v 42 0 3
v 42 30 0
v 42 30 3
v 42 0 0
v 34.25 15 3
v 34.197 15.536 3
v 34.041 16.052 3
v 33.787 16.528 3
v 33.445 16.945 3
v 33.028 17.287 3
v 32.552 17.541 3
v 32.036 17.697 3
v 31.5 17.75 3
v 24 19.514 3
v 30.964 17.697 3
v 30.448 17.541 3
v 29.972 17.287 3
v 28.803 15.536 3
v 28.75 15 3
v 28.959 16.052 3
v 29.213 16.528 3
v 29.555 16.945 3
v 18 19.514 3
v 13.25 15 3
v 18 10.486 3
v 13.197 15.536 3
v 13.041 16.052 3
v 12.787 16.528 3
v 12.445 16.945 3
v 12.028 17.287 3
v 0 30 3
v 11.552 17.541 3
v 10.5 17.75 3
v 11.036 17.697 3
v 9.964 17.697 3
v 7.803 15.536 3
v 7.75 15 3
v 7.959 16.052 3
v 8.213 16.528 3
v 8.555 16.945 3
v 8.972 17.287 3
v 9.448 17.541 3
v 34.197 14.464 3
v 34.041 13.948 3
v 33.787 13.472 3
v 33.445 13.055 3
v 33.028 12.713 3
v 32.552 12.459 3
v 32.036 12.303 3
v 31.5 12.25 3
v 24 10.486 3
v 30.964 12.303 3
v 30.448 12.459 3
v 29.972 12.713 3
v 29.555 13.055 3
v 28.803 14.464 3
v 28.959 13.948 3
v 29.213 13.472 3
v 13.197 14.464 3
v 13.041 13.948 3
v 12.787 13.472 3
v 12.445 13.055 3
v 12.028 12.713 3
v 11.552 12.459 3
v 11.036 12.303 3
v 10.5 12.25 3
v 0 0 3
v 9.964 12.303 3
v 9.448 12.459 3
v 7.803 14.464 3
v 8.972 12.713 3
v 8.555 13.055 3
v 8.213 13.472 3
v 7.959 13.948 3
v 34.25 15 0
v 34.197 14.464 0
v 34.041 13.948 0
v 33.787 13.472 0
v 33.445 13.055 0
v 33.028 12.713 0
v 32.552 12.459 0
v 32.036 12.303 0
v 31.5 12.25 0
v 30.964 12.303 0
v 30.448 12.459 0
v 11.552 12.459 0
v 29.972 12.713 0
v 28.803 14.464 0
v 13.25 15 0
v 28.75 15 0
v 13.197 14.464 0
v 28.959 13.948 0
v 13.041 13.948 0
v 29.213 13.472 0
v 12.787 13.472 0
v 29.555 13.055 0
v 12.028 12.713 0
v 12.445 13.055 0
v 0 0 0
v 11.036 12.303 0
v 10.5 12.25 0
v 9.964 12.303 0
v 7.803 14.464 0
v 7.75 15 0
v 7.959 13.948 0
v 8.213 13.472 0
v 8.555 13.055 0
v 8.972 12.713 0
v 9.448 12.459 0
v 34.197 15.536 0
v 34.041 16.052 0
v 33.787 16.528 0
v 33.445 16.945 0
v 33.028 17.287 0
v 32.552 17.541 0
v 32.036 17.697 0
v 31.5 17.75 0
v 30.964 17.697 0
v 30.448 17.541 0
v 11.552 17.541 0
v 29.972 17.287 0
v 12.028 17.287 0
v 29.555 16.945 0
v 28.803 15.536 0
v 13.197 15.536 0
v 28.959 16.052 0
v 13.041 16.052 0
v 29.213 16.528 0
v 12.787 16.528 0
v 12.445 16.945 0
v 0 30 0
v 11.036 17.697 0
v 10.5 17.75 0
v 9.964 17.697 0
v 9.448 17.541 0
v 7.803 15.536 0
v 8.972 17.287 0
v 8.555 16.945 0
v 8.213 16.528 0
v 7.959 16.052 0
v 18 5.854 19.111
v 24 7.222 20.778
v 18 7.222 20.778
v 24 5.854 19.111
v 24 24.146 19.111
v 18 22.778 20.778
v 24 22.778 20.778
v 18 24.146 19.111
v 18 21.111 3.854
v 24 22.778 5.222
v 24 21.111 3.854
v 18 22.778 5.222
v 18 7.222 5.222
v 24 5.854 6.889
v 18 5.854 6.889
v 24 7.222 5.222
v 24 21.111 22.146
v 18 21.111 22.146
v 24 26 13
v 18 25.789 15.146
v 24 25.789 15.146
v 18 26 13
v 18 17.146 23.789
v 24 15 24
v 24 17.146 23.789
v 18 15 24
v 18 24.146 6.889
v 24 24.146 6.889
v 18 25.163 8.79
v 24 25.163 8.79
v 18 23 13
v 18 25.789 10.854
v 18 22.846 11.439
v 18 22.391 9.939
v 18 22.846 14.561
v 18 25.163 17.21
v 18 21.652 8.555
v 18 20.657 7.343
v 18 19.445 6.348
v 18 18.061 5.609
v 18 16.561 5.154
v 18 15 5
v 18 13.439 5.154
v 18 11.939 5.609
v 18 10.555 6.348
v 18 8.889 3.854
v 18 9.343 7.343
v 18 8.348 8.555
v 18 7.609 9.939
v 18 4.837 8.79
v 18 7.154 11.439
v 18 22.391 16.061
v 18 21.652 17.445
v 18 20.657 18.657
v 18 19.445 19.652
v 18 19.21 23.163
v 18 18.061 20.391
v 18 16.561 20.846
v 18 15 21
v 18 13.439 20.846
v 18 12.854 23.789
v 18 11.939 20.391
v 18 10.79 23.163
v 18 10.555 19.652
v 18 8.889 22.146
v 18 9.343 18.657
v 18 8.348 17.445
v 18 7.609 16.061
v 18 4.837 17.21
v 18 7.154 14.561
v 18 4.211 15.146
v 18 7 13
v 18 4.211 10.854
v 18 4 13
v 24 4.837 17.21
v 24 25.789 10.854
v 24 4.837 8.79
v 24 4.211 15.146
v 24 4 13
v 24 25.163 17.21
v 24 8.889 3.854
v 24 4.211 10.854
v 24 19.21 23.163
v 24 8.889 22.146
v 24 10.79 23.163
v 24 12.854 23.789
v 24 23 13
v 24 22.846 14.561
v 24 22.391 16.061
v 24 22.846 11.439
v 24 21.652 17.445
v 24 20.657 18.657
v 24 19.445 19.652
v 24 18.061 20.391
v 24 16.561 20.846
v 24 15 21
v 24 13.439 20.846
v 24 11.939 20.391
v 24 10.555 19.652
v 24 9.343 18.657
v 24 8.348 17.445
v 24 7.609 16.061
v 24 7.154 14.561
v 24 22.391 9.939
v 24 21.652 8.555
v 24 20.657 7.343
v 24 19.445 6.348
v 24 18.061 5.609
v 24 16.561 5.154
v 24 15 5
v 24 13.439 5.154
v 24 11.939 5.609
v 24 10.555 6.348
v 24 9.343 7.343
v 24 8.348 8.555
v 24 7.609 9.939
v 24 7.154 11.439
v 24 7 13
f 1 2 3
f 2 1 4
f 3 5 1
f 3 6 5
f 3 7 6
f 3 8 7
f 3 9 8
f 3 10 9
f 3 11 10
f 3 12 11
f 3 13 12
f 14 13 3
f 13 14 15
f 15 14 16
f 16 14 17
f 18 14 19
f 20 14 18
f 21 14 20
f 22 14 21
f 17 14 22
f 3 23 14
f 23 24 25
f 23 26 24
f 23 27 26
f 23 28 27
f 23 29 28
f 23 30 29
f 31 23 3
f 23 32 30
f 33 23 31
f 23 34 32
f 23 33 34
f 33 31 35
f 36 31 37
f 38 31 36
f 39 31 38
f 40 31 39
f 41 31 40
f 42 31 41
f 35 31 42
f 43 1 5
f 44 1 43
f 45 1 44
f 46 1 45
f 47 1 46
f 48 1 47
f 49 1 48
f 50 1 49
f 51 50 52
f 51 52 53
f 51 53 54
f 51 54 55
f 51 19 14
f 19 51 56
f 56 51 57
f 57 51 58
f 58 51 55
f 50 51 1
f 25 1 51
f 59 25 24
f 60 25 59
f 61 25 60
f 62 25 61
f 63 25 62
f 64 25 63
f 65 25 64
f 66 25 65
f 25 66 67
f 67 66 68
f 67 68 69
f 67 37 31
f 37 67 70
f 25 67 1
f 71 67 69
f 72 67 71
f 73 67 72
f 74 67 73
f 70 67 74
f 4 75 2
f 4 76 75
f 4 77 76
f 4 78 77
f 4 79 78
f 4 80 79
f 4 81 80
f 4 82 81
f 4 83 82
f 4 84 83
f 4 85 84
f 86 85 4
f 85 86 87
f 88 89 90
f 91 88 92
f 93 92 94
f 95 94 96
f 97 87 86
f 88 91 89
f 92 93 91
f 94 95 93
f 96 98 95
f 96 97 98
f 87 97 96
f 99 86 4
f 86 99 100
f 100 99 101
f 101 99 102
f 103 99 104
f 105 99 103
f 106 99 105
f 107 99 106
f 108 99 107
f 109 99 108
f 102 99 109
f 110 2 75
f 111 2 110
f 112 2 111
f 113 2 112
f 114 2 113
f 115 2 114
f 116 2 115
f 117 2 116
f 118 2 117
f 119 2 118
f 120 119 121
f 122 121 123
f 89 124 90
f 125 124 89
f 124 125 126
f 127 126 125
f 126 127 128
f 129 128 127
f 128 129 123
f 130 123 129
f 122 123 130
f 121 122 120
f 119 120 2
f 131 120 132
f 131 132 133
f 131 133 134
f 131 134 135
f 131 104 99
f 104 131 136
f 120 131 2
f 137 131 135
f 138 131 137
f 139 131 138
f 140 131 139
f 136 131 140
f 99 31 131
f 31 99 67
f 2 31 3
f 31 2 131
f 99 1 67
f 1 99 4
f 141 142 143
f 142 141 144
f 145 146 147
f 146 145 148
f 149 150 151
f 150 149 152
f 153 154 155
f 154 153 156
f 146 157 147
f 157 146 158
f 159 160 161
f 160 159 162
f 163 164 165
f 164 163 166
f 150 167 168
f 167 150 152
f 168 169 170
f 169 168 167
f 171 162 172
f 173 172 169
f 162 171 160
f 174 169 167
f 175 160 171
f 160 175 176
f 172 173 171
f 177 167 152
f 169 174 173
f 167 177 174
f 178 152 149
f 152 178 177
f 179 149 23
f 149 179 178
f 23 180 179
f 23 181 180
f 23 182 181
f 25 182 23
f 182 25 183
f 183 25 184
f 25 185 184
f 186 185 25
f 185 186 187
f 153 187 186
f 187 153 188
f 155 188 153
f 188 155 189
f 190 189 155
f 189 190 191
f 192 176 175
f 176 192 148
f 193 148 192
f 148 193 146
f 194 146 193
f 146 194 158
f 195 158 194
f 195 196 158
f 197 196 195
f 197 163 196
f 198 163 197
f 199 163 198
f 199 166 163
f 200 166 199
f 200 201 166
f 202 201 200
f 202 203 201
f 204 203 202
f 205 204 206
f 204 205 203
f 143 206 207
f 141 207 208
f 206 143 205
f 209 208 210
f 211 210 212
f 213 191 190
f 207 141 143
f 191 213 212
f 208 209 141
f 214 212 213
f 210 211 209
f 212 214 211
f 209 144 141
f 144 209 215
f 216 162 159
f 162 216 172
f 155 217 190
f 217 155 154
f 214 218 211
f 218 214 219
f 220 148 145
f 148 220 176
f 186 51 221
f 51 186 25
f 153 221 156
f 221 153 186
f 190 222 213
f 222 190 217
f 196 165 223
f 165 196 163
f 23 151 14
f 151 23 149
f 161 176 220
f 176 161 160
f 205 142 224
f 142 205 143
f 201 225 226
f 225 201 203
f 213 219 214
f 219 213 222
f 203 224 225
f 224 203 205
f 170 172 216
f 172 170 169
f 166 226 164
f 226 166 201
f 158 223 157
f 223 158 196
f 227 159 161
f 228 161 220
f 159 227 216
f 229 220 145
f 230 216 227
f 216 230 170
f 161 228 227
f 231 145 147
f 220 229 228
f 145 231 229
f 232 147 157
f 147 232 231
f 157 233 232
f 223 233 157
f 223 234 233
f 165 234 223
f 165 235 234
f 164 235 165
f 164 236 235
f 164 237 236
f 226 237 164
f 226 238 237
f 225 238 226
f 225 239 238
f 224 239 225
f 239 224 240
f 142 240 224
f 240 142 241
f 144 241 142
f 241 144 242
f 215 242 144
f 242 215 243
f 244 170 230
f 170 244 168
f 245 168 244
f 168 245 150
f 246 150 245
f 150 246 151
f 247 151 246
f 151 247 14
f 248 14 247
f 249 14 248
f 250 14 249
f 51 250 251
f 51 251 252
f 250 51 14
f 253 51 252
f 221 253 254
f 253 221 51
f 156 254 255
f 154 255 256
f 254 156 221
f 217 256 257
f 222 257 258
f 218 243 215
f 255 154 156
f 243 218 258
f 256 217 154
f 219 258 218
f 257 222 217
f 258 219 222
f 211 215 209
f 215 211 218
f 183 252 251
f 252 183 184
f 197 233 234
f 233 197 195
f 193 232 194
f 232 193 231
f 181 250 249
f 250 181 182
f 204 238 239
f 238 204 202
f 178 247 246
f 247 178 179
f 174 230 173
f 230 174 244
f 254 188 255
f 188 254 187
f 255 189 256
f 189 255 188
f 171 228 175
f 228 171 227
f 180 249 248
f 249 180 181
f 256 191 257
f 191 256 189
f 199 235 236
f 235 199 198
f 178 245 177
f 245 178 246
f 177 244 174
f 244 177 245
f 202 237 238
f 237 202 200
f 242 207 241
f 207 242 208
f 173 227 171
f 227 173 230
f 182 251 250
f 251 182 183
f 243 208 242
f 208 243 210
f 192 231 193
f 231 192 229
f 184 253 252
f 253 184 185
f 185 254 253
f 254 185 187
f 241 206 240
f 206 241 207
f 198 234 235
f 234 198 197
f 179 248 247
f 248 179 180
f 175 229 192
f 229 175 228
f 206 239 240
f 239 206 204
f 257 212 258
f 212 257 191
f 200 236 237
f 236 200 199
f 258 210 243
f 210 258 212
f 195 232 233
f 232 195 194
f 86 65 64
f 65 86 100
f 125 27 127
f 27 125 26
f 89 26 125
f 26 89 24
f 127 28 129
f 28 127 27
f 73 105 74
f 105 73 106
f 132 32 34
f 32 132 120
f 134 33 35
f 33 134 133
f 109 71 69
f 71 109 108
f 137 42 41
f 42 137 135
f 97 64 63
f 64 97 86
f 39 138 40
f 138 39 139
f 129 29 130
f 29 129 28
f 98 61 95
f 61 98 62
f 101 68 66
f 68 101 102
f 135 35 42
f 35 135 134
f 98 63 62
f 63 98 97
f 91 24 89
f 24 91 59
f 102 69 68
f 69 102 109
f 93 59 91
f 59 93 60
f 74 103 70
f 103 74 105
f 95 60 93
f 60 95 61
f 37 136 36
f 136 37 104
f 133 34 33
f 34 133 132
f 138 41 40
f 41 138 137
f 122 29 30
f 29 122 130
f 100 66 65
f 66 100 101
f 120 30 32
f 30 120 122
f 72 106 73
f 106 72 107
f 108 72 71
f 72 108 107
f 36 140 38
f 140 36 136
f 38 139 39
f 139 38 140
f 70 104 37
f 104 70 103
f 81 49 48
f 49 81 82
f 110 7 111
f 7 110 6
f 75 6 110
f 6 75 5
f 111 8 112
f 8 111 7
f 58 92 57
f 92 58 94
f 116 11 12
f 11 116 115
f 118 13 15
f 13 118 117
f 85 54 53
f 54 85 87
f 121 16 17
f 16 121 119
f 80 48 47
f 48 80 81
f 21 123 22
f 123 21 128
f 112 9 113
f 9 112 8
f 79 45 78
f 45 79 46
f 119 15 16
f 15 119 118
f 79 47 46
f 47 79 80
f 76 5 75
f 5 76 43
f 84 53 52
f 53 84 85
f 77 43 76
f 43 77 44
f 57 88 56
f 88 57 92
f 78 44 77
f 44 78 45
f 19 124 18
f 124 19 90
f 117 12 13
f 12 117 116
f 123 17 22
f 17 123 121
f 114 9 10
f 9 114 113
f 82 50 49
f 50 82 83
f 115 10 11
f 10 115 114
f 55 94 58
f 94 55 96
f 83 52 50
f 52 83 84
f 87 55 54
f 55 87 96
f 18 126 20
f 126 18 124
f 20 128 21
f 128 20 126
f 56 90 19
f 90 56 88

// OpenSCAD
$fn = 32;

// ----------------------------------------------------------------------
// Cable clip: cable 16 mm, clamp 22 mm, base 42 mm
// ----------------------------------------------------------------------

// --- parameters (mm) ---
foot_w = 42;              // base length, X
foot_d = 30;              // base width, Y
foot_t = 3;               // base thickness
hose_seat_d = 22;         // clamp outside diameter
ring_t = 3;               // clamp wall
cable_d = 16;             // cable opening
ring_w = 6;               // clamp width along the cable
screw_d = 5.5;            // screw clearance
sink = 1;                 // overlap of the clamp into the base

module base() {
  cube([foot_w, foot_d, foot_t]);
}

module clamp() {
  translate([foot_w / 2, foot_d / 2, foot_t + hose_seat_d / 2 - sink]) rotate([0, 90, 0])
    cylinder(h = ring_w, d = hose_seat_d, center = true);
}

difference() {
  union() {
    base();
    clamp();
  }
  translate([foot_w / 2, foot_d / 2, foot_t + hose_seat_d / 2 - sink]) rotate([0, 90, 0]) translate([0, 0, -ring_w / 2 - 1]) cylinder(h = ring_w + 2, d = cable_d);
  translate([10.5, foot_d / 2, -1]) cylinder(h = foot_t + 2, d = screw_d);
  translate([31.5, foot_d / 2, -1]) cylinder(h = foot_t + 2, d = screw_d);
}
